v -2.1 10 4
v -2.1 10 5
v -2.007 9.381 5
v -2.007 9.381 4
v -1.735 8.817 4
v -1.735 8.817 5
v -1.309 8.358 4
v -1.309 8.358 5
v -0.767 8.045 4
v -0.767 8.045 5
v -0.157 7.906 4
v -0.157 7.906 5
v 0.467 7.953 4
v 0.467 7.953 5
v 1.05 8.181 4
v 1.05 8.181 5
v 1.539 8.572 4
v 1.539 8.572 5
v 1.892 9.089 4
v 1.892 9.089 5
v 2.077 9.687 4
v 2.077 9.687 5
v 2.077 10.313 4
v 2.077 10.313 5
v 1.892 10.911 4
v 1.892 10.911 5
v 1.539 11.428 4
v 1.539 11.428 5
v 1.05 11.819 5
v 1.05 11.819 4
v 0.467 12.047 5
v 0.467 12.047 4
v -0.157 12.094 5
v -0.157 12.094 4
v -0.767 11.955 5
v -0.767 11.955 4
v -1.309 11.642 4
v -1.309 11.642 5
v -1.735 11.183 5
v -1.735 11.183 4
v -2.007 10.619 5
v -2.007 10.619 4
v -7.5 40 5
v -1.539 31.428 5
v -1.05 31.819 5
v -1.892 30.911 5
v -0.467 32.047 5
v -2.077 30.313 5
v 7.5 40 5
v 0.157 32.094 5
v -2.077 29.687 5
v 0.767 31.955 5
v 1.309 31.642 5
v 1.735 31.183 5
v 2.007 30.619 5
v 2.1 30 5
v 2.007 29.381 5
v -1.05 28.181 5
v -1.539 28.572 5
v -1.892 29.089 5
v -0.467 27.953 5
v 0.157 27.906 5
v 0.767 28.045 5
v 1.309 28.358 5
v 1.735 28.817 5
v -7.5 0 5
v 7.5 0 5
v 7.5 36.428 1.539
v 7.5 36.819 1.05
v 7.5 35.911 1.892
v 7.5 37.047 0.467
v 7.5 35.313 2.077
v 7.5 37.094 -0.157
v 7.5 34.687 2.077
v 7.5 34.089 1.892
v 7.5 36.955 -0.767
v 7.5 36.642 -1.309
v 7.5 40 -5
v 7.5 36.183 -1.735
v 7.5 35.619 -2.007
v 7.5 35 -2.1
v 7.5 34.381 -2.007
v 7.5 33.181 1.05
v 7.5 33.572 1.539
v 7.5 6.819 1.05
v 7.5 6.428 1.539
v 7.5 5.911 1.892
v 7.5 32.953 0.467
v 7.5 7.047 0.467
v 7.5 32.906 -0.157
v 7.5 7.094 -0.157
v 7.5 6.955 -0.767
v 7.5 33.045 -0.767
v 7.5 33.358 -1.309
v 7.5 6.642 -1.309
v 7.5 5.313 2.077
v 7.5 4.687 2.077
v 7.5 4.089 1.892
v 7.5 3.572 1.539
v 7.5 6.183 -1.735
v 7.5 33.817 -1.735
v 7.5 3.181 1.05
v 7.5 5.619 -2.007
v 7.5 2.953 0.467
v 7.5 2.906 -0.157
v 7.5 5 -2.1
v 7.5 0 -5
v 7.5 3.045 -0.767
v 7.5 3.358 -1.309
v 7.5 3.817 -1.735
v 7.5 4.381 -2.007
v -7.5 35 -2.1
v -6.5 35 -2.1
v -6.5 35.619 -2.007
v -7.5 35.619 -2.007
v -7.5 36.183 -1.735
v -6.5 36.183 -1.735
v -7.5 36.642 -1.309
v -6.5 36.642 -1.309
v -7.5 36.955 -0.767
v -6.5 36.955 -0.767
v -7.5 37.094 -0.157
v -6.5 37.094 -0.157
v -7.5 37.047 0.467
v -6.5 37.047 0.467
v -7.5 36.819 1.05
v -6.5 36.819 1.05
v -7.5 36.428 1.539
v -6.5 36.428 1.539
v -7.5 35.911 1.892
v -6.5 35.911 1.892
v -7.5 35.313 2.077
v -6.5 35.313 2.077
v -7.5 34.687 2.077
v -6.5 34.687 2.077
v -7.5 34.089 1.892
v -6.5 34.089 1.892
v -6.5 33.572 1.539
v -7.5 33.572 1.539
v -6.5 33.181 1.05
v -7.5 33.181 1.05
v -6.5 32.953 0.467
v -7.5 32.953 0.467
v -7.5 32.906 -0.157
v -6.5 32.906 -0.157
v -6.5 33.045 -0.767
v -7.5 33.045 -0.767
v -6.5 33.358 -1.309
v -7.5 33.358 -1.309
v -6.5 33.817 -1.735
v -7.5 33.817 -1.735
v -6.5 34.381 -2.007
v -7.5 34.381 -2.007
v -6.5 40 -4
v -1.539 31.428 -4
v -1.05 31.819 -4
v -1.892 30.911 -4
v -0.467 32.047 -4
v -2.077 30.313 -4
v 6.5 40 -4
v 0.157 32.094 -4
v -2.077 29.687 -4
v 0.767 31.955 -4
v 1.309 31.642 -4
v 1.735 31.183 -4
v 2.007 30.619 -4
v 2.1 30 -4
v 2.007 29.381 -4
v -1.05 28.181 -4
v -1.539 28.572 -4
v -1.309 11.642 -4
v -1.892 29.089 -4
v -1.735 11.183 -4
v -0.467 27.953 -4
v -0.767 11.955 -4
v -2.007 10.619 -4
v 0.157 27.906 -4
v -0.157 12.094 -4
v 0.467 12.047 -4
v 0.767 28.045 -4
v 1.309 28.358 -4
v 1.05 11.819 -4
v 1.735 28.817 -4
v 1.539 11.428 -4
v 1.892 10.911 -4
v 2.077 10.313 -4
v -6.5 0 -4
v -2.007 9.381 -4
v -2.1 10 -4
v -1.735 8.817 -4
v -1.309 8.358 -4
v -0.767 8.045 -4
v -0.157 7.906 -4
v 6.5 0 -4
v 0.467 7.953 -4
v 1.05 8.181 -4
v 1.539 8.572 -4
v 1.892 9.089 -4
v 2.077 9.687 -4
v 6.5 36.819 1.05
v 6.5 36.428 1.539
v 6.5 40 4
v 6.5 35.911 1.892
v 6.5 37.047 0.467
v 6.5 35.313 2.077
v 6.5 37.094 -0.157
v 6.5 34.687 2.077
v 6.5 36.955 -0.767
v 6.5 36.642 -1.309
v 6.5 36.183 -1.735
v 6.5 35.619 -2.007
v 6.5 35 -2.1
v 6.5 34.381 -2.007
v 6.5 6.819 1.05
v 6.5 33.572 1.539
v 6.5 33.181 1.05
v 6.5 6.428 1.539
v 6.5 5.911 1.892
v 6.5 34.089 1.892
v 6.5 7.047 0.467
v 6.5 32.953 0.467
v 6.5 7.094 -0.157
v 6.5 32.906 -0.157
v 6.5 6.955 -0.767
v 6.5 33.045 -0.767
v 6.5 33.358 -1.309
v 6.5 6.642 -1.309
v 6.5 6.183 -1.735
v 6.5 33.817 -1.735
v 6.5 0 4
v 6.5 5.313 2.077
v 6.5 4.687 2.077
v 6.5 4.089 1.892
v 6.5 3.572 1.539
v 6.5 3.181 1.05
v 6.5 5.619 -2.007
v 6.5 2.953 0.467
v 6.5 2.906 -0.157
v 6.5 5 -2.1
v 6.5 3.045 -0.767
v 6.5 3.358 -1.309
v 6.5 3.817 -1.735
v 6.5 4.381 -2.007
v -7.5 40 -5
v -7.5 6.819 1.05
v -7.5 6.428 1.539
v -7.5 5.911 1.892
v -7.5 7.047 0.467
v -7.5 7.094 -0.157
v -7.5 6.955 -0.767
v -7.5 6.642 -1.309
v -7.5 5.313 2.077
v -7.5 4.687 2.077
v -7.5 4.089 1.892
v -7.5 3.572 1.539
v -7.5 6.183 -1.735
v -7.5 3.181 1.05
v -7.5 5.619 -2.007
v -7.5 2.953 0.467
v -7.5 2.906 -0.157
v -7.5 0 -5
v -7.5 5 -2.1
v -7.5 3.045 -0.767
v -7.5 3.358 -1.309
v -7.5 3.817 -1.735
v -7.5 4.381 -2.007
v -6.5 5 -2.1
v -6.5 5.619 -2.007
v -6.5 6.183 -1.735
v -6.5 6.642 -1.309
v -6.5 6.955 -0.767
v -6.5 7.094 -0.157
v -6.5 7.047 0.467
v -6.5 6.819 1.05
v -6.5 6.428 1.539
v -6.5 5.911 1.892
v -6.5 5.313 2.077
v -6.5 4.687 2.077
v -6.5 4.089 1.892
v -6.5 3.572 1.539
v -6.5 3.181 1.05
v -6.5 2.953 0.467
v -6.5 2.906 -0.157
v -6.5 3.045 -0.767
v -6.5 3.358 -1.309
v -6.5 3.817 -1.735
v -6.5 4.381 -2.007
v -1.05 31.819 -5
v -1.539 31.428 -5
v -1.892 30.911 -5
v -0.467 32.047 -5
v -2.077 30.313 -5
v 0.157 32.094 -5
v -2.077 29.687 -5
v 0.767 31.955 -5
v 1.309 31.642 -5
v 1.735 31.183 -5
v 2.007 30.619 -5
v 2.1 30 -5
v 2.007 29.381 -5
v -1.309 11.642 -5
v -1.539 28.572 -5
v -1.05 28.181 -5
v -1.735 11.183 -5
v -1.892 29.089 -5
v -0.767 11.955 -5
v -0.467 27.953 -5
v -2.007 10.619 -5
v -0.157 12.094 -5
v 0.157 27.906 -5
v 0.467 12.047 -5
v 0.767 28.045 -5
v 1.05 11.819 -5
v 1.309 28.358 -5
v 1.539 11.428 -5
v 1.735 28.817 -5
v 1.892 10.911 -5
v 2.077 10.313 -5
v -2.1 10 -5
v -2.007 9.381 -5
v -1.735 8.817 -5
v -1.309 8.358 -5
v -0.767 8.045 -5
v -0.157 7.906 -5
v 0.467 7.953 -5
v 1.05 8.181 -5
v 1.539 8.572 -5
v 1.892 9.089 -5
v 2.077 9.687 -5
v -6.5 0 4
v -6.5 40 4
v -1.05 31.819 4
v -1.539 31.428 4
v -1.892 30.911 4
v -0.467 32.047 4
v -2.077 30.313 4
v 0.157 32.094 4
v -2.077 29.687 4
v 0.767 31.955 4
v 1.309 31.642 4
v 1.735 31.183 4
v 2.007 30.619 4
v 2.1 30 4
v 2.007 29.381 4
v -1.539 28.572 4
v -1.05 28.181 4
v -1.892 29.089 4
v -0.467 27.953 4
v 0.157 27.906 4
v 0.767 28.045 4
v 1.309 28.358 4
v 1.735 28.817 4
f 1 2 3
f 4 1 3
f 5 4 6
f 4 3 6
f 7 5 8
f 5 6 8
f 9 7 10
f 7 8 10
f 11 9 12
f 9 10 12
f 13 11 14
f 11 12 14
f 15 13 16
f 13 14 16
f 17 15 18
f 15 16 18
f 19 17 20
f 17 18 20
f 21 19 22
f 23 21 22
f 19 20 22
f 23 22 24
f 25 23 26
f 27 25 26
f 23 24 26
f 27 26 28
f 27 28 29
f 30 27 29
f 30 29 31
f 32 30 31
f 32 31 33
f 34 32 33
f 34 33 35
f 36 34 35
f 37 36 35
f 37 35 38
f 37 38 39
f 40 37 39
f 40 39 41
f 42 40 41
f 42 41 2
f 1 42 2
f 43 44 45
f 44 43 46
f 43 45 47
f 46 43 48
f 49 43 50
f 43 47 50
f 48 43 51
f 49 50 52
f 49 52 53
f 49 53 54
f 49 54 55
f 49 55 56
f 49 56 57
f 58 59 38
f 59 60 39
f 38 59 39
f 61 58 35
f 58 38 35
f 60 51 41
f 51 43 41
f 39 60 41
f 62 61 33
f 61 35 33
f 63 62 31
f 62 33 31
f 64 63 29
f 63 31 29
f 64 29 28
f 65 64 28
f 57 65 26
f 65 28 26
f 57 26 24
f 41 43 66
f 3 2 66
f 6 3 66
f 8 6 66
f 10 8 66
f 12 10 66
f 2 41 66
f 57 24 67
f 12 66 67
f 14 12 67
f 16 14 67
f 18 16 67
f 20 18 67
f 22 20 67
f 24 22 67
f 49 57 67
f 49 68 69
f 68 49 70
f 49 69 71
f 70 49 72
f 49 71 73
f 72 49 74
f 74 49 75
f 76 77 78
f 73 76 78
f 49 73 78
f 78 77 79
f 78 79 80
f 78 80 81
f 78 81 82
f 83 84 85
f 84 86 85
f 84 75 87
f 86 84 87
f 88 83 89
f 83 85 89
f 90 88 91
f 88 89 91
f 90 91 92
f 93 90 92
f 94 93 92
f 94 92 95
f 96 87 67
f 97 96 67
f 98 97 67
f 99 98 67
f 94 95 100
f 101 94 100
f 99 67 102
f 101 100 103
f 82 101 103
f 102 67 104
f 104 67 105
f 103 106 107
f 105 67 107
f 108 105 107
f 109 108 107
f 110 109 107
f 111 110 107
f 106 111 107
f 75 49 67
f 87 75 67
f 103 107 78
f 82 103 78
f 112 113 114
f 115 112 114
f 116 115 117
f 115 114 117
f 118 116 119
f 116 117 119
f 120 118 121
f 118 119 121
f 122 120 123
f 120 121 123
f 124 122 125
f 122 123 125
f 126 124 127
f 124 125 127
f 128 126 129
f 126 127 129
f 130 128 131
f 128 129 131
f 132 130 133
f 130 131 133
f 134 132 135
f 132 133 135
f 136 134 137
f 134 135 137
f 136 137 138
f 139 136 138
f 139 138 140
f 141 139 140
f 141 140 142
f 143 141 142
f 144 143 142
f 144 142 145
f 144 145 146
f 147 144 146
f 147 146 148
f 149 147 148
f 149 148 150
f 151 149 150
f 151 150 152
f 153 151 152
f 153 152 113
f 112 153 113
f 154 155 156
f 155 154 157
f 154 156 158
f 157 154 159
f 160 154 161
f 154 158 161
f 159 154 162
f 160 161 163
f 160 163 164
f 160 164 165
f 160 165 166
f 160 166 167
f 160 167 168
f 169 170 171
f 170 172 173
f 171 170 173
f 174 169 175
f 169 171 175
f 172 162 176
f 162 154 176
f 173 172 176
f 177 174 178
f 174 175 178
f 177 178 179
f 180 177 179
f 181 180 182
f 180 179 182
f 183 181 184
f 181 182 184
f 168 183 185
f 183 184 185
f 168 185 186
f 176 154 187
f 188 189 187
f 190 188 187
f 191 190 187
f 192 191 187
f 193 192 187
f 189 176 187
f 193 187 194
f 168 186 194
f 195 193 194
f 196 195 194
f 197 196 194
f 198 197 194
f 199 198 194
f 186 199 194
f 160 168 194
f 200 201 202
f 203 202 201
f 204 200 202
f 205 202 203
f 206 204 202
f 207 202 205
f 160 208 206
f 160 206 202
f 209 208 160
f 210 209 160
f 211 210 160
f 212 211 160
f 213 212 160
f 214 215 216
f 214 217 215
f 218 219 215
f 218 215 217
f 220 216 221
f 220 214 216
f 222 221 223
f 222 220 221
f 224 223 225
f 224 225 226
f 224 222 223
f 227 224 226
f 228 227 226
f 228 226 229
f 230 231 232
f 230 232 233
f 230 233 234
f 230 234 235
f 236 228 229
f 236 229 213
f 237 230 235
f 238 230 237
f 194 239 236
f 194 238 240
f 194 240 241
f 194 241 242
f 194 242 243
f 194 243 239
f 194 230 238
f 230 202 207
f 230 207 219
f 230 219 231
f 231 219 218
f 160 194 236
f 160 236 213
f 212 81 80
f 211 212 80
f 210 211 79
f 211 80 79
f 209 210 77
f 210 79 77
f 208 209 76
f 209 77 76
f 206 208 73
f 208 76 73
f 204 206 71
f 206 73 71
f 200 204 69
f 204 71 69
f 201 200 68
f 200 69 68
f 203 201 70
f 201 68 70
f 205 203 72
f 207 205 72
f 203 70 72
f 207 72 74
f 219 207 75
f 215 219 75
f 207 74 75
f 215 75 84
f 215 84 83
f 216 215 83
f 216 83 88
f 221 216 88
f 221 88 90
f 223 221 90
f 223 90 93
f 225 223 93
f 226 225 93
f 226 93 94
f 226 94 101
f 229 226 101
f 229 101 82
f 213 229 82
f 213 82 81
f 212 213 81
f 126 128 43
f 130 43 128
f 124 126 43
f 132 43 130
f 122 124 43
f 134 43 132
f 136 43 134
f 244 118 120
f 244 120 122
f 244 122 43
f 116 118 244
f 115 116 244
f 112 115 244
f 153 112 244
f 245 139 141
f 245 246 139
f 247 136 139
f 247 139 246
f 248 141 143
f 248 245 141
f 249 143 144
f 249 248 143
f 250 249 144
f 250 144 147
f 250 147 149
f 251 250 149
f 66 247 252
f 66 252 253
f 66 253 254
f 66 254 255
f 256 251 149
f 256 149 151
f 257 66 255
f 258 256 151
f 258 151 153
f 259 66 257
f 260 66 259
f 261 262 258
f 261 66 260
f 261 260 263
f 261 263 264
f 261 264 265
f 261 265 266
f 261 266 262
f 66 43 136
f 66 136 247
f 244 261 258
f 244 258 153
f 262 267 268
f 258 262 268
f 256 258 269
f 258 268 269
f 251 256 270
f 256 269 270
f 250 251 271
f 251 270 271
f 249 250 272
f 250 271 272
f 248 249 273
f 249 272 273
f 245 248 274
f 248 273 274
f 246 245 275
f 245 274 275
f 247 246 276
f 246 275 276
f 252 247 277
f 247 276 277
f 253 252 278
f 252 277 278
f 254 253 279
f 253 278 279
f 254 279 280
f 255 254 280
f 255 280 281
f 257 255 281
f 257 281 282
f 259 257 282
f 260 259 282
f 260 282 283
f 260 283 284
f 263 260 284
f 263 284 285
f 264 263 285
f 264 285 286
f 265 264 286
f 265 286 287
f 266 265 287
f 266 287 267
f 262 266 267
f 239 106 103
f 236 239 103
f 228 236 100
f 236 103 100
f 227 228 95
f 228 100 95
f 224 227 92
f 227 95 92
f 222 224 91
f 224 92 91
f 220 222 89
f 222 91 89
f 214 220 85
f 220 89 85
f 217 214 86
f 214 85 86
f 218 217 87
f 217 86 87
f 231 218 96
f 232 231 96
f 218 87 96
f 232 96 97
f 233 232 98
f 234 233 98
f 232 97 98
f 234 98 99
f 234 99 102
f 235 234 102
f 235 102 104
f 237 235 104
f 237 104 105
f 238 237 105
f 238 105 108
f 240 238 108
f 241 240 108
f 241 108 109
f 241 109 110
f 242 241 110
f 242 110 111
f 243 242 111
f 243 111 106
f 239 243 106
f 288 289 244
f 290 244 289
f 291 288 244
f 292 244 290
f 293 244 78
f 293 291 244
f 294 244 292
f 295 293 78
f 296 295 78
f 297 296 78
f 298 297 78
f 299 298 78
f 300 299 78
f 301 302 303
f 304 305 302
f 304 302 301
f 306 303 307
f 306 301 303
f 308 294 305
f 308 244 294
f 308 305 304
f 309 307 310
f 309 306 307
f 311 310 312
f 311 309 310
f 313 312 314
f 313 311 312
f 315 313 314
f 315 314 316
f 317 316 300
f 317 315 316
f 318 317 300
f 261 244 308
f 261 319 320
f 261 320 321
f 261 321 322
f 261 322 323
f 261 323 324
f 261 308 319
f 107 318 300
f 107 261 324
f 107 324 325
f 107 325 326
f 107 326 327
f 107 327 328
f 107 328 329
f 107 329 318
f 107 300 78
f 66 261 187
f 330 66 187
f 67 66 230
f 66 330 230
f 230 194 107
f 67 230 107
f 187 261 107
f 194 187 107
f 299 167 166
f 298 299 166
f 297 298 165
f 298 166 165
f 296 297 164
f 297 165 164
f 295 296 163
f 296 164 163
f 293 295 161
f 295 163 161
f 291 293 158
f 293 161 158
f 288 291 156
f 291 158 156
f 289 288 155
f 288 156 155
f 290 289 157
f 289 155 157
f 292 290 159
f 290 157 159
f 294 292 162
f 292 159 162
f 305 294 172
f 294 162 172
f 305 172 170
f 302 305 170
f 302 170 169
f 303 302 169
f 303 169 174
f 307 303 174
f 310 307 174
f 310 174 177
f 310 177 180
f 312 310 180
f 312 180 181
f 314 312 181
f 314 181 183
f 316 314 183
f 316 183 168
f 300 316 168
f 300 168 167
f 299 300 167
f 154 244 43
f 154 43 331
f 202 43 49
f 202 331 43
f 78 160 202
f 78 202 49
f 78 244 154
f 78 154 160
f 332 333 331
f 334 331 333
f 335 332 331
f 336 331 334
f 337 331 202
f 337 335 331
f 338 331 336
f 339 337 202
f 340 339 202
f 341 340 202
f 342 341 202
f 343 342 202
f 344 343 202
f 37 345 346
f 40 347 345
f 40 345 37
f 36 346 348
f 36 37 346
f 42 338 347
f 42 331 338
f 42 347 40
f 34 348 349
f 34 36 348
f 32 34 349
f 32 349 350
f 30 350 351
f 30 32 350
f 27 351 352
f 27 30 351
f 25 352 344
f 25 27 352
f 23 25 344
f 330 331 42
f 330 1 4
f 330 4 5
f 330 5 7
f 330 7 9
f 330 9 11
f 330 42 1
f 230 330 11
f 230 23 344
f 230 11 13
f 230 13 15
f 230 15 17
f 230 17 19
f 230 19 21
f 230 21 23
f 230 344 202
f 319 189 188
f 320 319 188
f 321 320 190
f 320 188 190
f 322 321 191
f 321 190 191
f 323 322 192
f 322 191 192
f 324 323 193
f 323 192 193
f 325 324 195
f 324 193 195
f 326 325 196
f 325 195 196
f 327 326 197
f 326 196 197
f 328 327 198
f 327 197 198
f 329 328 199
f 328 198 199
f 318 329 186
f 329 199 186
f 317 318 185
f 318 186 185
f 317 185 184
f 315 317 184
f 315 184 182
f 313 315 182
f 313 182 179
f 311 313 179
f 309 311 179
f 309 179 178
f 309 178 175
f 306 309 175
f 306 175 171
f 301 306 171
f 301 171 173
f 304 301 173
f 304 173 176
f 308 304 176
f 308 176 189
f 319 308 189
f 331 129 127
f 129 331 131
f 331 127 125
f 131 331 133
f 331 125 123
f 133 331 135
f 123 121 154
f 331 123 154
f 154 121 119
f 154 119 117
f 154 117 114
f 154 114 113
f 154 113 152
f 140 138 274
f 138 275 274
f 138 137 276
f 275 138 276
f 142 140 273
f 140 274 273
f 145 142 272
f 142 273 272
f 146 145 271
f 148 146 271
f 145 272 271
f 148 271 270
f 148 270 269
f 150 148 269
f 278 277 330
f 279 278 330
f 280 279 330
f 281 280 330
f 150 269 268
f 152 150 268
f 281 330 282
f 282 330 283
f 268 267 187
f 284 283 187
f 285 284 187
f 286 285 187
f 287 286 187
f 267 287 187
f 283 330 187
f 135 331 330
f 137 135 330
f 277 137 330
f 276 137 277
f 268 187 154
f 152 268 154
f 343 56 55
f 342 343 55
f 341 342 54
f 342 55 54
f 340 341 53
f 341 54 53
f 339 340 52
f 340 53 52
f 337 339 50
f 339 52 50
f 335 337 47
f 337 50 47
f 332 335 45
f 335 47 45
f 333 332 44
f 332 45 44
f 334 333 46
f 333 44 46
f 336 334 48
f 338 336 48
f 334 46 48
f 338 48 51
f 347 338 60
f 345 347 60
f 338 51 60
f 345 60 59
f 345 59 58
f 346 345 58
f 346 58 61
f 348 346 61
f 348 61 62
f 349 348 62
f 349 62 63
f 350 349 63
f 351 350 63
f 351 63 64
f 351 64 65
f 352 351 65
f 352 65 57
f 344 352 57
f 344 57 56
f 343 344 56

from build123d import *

# Parameters (mm, degrees)
SKETCH_1_W          = 15
SKETCH_1_H          = 10
SKETCH_1_W_2        = 13
SKETCH_1_H_2        = 8
EXTRUDE_1_DEPTH     = 40
SKETCH_2_R          = 2.1
CUT_EXTRUDE_1_DEPTH = 44.011626335
SKETCH_3_R          = 2.1
CUT_EXTRUDE_2_DEPTH = 42.907636536


with BuildPart() as part:
    # ｽｹｯﾁ1 → 押し出し-薄板1 (new body)
    with BuildSketch(Plane(origin=(0, 0, 0), x_dir=(1, 0, 0), z_dir=(0, 1, 0))):
        Rectangle(SKETCH_1_W, SKETCH_1_H)
        Rectangle(SKETCH_1_W_2, SKETCH_1_H_2, mode=Mode.SUBTRACT)
    extrude(amount=EXTRUDE_1_DEPTH)

    # ｽｹｯﾁ2 → ｶｯﾄ - 押し出し1 (cut, through all)
    with BuildSketch(Plane(origin=(7.5, 0, 0), x_dir=(0, 0, -1), z_dir=(1, 0, 0))):
        with Locations((0, 35)):
            Circle(SKETCH_2_R)
        with Locations((0, 5)):
            Circle(SKETCH_2_R)
    extrude(amount=-CUT_EXTRUDE_1_DEPTH, mode=Mode.SUBTRACT)

    # ｽｹｯﾁ3 → ｶｯﾄ - 押し出し2 (cut, through all)
    with BuildSketch(Plane.XY.offset(5)):
        with Locations((0, 30)):
            Circle(SKETCH_3_R)
        with Locations(Location((0, 10, 0), (0, 0, 180))):
            Circle(SKETCH_3_R)
    extrude(amount=-CUT_EXTRUDE_2_DEPTH, mode=Mode.SUBTRACT)


solid = part.part
